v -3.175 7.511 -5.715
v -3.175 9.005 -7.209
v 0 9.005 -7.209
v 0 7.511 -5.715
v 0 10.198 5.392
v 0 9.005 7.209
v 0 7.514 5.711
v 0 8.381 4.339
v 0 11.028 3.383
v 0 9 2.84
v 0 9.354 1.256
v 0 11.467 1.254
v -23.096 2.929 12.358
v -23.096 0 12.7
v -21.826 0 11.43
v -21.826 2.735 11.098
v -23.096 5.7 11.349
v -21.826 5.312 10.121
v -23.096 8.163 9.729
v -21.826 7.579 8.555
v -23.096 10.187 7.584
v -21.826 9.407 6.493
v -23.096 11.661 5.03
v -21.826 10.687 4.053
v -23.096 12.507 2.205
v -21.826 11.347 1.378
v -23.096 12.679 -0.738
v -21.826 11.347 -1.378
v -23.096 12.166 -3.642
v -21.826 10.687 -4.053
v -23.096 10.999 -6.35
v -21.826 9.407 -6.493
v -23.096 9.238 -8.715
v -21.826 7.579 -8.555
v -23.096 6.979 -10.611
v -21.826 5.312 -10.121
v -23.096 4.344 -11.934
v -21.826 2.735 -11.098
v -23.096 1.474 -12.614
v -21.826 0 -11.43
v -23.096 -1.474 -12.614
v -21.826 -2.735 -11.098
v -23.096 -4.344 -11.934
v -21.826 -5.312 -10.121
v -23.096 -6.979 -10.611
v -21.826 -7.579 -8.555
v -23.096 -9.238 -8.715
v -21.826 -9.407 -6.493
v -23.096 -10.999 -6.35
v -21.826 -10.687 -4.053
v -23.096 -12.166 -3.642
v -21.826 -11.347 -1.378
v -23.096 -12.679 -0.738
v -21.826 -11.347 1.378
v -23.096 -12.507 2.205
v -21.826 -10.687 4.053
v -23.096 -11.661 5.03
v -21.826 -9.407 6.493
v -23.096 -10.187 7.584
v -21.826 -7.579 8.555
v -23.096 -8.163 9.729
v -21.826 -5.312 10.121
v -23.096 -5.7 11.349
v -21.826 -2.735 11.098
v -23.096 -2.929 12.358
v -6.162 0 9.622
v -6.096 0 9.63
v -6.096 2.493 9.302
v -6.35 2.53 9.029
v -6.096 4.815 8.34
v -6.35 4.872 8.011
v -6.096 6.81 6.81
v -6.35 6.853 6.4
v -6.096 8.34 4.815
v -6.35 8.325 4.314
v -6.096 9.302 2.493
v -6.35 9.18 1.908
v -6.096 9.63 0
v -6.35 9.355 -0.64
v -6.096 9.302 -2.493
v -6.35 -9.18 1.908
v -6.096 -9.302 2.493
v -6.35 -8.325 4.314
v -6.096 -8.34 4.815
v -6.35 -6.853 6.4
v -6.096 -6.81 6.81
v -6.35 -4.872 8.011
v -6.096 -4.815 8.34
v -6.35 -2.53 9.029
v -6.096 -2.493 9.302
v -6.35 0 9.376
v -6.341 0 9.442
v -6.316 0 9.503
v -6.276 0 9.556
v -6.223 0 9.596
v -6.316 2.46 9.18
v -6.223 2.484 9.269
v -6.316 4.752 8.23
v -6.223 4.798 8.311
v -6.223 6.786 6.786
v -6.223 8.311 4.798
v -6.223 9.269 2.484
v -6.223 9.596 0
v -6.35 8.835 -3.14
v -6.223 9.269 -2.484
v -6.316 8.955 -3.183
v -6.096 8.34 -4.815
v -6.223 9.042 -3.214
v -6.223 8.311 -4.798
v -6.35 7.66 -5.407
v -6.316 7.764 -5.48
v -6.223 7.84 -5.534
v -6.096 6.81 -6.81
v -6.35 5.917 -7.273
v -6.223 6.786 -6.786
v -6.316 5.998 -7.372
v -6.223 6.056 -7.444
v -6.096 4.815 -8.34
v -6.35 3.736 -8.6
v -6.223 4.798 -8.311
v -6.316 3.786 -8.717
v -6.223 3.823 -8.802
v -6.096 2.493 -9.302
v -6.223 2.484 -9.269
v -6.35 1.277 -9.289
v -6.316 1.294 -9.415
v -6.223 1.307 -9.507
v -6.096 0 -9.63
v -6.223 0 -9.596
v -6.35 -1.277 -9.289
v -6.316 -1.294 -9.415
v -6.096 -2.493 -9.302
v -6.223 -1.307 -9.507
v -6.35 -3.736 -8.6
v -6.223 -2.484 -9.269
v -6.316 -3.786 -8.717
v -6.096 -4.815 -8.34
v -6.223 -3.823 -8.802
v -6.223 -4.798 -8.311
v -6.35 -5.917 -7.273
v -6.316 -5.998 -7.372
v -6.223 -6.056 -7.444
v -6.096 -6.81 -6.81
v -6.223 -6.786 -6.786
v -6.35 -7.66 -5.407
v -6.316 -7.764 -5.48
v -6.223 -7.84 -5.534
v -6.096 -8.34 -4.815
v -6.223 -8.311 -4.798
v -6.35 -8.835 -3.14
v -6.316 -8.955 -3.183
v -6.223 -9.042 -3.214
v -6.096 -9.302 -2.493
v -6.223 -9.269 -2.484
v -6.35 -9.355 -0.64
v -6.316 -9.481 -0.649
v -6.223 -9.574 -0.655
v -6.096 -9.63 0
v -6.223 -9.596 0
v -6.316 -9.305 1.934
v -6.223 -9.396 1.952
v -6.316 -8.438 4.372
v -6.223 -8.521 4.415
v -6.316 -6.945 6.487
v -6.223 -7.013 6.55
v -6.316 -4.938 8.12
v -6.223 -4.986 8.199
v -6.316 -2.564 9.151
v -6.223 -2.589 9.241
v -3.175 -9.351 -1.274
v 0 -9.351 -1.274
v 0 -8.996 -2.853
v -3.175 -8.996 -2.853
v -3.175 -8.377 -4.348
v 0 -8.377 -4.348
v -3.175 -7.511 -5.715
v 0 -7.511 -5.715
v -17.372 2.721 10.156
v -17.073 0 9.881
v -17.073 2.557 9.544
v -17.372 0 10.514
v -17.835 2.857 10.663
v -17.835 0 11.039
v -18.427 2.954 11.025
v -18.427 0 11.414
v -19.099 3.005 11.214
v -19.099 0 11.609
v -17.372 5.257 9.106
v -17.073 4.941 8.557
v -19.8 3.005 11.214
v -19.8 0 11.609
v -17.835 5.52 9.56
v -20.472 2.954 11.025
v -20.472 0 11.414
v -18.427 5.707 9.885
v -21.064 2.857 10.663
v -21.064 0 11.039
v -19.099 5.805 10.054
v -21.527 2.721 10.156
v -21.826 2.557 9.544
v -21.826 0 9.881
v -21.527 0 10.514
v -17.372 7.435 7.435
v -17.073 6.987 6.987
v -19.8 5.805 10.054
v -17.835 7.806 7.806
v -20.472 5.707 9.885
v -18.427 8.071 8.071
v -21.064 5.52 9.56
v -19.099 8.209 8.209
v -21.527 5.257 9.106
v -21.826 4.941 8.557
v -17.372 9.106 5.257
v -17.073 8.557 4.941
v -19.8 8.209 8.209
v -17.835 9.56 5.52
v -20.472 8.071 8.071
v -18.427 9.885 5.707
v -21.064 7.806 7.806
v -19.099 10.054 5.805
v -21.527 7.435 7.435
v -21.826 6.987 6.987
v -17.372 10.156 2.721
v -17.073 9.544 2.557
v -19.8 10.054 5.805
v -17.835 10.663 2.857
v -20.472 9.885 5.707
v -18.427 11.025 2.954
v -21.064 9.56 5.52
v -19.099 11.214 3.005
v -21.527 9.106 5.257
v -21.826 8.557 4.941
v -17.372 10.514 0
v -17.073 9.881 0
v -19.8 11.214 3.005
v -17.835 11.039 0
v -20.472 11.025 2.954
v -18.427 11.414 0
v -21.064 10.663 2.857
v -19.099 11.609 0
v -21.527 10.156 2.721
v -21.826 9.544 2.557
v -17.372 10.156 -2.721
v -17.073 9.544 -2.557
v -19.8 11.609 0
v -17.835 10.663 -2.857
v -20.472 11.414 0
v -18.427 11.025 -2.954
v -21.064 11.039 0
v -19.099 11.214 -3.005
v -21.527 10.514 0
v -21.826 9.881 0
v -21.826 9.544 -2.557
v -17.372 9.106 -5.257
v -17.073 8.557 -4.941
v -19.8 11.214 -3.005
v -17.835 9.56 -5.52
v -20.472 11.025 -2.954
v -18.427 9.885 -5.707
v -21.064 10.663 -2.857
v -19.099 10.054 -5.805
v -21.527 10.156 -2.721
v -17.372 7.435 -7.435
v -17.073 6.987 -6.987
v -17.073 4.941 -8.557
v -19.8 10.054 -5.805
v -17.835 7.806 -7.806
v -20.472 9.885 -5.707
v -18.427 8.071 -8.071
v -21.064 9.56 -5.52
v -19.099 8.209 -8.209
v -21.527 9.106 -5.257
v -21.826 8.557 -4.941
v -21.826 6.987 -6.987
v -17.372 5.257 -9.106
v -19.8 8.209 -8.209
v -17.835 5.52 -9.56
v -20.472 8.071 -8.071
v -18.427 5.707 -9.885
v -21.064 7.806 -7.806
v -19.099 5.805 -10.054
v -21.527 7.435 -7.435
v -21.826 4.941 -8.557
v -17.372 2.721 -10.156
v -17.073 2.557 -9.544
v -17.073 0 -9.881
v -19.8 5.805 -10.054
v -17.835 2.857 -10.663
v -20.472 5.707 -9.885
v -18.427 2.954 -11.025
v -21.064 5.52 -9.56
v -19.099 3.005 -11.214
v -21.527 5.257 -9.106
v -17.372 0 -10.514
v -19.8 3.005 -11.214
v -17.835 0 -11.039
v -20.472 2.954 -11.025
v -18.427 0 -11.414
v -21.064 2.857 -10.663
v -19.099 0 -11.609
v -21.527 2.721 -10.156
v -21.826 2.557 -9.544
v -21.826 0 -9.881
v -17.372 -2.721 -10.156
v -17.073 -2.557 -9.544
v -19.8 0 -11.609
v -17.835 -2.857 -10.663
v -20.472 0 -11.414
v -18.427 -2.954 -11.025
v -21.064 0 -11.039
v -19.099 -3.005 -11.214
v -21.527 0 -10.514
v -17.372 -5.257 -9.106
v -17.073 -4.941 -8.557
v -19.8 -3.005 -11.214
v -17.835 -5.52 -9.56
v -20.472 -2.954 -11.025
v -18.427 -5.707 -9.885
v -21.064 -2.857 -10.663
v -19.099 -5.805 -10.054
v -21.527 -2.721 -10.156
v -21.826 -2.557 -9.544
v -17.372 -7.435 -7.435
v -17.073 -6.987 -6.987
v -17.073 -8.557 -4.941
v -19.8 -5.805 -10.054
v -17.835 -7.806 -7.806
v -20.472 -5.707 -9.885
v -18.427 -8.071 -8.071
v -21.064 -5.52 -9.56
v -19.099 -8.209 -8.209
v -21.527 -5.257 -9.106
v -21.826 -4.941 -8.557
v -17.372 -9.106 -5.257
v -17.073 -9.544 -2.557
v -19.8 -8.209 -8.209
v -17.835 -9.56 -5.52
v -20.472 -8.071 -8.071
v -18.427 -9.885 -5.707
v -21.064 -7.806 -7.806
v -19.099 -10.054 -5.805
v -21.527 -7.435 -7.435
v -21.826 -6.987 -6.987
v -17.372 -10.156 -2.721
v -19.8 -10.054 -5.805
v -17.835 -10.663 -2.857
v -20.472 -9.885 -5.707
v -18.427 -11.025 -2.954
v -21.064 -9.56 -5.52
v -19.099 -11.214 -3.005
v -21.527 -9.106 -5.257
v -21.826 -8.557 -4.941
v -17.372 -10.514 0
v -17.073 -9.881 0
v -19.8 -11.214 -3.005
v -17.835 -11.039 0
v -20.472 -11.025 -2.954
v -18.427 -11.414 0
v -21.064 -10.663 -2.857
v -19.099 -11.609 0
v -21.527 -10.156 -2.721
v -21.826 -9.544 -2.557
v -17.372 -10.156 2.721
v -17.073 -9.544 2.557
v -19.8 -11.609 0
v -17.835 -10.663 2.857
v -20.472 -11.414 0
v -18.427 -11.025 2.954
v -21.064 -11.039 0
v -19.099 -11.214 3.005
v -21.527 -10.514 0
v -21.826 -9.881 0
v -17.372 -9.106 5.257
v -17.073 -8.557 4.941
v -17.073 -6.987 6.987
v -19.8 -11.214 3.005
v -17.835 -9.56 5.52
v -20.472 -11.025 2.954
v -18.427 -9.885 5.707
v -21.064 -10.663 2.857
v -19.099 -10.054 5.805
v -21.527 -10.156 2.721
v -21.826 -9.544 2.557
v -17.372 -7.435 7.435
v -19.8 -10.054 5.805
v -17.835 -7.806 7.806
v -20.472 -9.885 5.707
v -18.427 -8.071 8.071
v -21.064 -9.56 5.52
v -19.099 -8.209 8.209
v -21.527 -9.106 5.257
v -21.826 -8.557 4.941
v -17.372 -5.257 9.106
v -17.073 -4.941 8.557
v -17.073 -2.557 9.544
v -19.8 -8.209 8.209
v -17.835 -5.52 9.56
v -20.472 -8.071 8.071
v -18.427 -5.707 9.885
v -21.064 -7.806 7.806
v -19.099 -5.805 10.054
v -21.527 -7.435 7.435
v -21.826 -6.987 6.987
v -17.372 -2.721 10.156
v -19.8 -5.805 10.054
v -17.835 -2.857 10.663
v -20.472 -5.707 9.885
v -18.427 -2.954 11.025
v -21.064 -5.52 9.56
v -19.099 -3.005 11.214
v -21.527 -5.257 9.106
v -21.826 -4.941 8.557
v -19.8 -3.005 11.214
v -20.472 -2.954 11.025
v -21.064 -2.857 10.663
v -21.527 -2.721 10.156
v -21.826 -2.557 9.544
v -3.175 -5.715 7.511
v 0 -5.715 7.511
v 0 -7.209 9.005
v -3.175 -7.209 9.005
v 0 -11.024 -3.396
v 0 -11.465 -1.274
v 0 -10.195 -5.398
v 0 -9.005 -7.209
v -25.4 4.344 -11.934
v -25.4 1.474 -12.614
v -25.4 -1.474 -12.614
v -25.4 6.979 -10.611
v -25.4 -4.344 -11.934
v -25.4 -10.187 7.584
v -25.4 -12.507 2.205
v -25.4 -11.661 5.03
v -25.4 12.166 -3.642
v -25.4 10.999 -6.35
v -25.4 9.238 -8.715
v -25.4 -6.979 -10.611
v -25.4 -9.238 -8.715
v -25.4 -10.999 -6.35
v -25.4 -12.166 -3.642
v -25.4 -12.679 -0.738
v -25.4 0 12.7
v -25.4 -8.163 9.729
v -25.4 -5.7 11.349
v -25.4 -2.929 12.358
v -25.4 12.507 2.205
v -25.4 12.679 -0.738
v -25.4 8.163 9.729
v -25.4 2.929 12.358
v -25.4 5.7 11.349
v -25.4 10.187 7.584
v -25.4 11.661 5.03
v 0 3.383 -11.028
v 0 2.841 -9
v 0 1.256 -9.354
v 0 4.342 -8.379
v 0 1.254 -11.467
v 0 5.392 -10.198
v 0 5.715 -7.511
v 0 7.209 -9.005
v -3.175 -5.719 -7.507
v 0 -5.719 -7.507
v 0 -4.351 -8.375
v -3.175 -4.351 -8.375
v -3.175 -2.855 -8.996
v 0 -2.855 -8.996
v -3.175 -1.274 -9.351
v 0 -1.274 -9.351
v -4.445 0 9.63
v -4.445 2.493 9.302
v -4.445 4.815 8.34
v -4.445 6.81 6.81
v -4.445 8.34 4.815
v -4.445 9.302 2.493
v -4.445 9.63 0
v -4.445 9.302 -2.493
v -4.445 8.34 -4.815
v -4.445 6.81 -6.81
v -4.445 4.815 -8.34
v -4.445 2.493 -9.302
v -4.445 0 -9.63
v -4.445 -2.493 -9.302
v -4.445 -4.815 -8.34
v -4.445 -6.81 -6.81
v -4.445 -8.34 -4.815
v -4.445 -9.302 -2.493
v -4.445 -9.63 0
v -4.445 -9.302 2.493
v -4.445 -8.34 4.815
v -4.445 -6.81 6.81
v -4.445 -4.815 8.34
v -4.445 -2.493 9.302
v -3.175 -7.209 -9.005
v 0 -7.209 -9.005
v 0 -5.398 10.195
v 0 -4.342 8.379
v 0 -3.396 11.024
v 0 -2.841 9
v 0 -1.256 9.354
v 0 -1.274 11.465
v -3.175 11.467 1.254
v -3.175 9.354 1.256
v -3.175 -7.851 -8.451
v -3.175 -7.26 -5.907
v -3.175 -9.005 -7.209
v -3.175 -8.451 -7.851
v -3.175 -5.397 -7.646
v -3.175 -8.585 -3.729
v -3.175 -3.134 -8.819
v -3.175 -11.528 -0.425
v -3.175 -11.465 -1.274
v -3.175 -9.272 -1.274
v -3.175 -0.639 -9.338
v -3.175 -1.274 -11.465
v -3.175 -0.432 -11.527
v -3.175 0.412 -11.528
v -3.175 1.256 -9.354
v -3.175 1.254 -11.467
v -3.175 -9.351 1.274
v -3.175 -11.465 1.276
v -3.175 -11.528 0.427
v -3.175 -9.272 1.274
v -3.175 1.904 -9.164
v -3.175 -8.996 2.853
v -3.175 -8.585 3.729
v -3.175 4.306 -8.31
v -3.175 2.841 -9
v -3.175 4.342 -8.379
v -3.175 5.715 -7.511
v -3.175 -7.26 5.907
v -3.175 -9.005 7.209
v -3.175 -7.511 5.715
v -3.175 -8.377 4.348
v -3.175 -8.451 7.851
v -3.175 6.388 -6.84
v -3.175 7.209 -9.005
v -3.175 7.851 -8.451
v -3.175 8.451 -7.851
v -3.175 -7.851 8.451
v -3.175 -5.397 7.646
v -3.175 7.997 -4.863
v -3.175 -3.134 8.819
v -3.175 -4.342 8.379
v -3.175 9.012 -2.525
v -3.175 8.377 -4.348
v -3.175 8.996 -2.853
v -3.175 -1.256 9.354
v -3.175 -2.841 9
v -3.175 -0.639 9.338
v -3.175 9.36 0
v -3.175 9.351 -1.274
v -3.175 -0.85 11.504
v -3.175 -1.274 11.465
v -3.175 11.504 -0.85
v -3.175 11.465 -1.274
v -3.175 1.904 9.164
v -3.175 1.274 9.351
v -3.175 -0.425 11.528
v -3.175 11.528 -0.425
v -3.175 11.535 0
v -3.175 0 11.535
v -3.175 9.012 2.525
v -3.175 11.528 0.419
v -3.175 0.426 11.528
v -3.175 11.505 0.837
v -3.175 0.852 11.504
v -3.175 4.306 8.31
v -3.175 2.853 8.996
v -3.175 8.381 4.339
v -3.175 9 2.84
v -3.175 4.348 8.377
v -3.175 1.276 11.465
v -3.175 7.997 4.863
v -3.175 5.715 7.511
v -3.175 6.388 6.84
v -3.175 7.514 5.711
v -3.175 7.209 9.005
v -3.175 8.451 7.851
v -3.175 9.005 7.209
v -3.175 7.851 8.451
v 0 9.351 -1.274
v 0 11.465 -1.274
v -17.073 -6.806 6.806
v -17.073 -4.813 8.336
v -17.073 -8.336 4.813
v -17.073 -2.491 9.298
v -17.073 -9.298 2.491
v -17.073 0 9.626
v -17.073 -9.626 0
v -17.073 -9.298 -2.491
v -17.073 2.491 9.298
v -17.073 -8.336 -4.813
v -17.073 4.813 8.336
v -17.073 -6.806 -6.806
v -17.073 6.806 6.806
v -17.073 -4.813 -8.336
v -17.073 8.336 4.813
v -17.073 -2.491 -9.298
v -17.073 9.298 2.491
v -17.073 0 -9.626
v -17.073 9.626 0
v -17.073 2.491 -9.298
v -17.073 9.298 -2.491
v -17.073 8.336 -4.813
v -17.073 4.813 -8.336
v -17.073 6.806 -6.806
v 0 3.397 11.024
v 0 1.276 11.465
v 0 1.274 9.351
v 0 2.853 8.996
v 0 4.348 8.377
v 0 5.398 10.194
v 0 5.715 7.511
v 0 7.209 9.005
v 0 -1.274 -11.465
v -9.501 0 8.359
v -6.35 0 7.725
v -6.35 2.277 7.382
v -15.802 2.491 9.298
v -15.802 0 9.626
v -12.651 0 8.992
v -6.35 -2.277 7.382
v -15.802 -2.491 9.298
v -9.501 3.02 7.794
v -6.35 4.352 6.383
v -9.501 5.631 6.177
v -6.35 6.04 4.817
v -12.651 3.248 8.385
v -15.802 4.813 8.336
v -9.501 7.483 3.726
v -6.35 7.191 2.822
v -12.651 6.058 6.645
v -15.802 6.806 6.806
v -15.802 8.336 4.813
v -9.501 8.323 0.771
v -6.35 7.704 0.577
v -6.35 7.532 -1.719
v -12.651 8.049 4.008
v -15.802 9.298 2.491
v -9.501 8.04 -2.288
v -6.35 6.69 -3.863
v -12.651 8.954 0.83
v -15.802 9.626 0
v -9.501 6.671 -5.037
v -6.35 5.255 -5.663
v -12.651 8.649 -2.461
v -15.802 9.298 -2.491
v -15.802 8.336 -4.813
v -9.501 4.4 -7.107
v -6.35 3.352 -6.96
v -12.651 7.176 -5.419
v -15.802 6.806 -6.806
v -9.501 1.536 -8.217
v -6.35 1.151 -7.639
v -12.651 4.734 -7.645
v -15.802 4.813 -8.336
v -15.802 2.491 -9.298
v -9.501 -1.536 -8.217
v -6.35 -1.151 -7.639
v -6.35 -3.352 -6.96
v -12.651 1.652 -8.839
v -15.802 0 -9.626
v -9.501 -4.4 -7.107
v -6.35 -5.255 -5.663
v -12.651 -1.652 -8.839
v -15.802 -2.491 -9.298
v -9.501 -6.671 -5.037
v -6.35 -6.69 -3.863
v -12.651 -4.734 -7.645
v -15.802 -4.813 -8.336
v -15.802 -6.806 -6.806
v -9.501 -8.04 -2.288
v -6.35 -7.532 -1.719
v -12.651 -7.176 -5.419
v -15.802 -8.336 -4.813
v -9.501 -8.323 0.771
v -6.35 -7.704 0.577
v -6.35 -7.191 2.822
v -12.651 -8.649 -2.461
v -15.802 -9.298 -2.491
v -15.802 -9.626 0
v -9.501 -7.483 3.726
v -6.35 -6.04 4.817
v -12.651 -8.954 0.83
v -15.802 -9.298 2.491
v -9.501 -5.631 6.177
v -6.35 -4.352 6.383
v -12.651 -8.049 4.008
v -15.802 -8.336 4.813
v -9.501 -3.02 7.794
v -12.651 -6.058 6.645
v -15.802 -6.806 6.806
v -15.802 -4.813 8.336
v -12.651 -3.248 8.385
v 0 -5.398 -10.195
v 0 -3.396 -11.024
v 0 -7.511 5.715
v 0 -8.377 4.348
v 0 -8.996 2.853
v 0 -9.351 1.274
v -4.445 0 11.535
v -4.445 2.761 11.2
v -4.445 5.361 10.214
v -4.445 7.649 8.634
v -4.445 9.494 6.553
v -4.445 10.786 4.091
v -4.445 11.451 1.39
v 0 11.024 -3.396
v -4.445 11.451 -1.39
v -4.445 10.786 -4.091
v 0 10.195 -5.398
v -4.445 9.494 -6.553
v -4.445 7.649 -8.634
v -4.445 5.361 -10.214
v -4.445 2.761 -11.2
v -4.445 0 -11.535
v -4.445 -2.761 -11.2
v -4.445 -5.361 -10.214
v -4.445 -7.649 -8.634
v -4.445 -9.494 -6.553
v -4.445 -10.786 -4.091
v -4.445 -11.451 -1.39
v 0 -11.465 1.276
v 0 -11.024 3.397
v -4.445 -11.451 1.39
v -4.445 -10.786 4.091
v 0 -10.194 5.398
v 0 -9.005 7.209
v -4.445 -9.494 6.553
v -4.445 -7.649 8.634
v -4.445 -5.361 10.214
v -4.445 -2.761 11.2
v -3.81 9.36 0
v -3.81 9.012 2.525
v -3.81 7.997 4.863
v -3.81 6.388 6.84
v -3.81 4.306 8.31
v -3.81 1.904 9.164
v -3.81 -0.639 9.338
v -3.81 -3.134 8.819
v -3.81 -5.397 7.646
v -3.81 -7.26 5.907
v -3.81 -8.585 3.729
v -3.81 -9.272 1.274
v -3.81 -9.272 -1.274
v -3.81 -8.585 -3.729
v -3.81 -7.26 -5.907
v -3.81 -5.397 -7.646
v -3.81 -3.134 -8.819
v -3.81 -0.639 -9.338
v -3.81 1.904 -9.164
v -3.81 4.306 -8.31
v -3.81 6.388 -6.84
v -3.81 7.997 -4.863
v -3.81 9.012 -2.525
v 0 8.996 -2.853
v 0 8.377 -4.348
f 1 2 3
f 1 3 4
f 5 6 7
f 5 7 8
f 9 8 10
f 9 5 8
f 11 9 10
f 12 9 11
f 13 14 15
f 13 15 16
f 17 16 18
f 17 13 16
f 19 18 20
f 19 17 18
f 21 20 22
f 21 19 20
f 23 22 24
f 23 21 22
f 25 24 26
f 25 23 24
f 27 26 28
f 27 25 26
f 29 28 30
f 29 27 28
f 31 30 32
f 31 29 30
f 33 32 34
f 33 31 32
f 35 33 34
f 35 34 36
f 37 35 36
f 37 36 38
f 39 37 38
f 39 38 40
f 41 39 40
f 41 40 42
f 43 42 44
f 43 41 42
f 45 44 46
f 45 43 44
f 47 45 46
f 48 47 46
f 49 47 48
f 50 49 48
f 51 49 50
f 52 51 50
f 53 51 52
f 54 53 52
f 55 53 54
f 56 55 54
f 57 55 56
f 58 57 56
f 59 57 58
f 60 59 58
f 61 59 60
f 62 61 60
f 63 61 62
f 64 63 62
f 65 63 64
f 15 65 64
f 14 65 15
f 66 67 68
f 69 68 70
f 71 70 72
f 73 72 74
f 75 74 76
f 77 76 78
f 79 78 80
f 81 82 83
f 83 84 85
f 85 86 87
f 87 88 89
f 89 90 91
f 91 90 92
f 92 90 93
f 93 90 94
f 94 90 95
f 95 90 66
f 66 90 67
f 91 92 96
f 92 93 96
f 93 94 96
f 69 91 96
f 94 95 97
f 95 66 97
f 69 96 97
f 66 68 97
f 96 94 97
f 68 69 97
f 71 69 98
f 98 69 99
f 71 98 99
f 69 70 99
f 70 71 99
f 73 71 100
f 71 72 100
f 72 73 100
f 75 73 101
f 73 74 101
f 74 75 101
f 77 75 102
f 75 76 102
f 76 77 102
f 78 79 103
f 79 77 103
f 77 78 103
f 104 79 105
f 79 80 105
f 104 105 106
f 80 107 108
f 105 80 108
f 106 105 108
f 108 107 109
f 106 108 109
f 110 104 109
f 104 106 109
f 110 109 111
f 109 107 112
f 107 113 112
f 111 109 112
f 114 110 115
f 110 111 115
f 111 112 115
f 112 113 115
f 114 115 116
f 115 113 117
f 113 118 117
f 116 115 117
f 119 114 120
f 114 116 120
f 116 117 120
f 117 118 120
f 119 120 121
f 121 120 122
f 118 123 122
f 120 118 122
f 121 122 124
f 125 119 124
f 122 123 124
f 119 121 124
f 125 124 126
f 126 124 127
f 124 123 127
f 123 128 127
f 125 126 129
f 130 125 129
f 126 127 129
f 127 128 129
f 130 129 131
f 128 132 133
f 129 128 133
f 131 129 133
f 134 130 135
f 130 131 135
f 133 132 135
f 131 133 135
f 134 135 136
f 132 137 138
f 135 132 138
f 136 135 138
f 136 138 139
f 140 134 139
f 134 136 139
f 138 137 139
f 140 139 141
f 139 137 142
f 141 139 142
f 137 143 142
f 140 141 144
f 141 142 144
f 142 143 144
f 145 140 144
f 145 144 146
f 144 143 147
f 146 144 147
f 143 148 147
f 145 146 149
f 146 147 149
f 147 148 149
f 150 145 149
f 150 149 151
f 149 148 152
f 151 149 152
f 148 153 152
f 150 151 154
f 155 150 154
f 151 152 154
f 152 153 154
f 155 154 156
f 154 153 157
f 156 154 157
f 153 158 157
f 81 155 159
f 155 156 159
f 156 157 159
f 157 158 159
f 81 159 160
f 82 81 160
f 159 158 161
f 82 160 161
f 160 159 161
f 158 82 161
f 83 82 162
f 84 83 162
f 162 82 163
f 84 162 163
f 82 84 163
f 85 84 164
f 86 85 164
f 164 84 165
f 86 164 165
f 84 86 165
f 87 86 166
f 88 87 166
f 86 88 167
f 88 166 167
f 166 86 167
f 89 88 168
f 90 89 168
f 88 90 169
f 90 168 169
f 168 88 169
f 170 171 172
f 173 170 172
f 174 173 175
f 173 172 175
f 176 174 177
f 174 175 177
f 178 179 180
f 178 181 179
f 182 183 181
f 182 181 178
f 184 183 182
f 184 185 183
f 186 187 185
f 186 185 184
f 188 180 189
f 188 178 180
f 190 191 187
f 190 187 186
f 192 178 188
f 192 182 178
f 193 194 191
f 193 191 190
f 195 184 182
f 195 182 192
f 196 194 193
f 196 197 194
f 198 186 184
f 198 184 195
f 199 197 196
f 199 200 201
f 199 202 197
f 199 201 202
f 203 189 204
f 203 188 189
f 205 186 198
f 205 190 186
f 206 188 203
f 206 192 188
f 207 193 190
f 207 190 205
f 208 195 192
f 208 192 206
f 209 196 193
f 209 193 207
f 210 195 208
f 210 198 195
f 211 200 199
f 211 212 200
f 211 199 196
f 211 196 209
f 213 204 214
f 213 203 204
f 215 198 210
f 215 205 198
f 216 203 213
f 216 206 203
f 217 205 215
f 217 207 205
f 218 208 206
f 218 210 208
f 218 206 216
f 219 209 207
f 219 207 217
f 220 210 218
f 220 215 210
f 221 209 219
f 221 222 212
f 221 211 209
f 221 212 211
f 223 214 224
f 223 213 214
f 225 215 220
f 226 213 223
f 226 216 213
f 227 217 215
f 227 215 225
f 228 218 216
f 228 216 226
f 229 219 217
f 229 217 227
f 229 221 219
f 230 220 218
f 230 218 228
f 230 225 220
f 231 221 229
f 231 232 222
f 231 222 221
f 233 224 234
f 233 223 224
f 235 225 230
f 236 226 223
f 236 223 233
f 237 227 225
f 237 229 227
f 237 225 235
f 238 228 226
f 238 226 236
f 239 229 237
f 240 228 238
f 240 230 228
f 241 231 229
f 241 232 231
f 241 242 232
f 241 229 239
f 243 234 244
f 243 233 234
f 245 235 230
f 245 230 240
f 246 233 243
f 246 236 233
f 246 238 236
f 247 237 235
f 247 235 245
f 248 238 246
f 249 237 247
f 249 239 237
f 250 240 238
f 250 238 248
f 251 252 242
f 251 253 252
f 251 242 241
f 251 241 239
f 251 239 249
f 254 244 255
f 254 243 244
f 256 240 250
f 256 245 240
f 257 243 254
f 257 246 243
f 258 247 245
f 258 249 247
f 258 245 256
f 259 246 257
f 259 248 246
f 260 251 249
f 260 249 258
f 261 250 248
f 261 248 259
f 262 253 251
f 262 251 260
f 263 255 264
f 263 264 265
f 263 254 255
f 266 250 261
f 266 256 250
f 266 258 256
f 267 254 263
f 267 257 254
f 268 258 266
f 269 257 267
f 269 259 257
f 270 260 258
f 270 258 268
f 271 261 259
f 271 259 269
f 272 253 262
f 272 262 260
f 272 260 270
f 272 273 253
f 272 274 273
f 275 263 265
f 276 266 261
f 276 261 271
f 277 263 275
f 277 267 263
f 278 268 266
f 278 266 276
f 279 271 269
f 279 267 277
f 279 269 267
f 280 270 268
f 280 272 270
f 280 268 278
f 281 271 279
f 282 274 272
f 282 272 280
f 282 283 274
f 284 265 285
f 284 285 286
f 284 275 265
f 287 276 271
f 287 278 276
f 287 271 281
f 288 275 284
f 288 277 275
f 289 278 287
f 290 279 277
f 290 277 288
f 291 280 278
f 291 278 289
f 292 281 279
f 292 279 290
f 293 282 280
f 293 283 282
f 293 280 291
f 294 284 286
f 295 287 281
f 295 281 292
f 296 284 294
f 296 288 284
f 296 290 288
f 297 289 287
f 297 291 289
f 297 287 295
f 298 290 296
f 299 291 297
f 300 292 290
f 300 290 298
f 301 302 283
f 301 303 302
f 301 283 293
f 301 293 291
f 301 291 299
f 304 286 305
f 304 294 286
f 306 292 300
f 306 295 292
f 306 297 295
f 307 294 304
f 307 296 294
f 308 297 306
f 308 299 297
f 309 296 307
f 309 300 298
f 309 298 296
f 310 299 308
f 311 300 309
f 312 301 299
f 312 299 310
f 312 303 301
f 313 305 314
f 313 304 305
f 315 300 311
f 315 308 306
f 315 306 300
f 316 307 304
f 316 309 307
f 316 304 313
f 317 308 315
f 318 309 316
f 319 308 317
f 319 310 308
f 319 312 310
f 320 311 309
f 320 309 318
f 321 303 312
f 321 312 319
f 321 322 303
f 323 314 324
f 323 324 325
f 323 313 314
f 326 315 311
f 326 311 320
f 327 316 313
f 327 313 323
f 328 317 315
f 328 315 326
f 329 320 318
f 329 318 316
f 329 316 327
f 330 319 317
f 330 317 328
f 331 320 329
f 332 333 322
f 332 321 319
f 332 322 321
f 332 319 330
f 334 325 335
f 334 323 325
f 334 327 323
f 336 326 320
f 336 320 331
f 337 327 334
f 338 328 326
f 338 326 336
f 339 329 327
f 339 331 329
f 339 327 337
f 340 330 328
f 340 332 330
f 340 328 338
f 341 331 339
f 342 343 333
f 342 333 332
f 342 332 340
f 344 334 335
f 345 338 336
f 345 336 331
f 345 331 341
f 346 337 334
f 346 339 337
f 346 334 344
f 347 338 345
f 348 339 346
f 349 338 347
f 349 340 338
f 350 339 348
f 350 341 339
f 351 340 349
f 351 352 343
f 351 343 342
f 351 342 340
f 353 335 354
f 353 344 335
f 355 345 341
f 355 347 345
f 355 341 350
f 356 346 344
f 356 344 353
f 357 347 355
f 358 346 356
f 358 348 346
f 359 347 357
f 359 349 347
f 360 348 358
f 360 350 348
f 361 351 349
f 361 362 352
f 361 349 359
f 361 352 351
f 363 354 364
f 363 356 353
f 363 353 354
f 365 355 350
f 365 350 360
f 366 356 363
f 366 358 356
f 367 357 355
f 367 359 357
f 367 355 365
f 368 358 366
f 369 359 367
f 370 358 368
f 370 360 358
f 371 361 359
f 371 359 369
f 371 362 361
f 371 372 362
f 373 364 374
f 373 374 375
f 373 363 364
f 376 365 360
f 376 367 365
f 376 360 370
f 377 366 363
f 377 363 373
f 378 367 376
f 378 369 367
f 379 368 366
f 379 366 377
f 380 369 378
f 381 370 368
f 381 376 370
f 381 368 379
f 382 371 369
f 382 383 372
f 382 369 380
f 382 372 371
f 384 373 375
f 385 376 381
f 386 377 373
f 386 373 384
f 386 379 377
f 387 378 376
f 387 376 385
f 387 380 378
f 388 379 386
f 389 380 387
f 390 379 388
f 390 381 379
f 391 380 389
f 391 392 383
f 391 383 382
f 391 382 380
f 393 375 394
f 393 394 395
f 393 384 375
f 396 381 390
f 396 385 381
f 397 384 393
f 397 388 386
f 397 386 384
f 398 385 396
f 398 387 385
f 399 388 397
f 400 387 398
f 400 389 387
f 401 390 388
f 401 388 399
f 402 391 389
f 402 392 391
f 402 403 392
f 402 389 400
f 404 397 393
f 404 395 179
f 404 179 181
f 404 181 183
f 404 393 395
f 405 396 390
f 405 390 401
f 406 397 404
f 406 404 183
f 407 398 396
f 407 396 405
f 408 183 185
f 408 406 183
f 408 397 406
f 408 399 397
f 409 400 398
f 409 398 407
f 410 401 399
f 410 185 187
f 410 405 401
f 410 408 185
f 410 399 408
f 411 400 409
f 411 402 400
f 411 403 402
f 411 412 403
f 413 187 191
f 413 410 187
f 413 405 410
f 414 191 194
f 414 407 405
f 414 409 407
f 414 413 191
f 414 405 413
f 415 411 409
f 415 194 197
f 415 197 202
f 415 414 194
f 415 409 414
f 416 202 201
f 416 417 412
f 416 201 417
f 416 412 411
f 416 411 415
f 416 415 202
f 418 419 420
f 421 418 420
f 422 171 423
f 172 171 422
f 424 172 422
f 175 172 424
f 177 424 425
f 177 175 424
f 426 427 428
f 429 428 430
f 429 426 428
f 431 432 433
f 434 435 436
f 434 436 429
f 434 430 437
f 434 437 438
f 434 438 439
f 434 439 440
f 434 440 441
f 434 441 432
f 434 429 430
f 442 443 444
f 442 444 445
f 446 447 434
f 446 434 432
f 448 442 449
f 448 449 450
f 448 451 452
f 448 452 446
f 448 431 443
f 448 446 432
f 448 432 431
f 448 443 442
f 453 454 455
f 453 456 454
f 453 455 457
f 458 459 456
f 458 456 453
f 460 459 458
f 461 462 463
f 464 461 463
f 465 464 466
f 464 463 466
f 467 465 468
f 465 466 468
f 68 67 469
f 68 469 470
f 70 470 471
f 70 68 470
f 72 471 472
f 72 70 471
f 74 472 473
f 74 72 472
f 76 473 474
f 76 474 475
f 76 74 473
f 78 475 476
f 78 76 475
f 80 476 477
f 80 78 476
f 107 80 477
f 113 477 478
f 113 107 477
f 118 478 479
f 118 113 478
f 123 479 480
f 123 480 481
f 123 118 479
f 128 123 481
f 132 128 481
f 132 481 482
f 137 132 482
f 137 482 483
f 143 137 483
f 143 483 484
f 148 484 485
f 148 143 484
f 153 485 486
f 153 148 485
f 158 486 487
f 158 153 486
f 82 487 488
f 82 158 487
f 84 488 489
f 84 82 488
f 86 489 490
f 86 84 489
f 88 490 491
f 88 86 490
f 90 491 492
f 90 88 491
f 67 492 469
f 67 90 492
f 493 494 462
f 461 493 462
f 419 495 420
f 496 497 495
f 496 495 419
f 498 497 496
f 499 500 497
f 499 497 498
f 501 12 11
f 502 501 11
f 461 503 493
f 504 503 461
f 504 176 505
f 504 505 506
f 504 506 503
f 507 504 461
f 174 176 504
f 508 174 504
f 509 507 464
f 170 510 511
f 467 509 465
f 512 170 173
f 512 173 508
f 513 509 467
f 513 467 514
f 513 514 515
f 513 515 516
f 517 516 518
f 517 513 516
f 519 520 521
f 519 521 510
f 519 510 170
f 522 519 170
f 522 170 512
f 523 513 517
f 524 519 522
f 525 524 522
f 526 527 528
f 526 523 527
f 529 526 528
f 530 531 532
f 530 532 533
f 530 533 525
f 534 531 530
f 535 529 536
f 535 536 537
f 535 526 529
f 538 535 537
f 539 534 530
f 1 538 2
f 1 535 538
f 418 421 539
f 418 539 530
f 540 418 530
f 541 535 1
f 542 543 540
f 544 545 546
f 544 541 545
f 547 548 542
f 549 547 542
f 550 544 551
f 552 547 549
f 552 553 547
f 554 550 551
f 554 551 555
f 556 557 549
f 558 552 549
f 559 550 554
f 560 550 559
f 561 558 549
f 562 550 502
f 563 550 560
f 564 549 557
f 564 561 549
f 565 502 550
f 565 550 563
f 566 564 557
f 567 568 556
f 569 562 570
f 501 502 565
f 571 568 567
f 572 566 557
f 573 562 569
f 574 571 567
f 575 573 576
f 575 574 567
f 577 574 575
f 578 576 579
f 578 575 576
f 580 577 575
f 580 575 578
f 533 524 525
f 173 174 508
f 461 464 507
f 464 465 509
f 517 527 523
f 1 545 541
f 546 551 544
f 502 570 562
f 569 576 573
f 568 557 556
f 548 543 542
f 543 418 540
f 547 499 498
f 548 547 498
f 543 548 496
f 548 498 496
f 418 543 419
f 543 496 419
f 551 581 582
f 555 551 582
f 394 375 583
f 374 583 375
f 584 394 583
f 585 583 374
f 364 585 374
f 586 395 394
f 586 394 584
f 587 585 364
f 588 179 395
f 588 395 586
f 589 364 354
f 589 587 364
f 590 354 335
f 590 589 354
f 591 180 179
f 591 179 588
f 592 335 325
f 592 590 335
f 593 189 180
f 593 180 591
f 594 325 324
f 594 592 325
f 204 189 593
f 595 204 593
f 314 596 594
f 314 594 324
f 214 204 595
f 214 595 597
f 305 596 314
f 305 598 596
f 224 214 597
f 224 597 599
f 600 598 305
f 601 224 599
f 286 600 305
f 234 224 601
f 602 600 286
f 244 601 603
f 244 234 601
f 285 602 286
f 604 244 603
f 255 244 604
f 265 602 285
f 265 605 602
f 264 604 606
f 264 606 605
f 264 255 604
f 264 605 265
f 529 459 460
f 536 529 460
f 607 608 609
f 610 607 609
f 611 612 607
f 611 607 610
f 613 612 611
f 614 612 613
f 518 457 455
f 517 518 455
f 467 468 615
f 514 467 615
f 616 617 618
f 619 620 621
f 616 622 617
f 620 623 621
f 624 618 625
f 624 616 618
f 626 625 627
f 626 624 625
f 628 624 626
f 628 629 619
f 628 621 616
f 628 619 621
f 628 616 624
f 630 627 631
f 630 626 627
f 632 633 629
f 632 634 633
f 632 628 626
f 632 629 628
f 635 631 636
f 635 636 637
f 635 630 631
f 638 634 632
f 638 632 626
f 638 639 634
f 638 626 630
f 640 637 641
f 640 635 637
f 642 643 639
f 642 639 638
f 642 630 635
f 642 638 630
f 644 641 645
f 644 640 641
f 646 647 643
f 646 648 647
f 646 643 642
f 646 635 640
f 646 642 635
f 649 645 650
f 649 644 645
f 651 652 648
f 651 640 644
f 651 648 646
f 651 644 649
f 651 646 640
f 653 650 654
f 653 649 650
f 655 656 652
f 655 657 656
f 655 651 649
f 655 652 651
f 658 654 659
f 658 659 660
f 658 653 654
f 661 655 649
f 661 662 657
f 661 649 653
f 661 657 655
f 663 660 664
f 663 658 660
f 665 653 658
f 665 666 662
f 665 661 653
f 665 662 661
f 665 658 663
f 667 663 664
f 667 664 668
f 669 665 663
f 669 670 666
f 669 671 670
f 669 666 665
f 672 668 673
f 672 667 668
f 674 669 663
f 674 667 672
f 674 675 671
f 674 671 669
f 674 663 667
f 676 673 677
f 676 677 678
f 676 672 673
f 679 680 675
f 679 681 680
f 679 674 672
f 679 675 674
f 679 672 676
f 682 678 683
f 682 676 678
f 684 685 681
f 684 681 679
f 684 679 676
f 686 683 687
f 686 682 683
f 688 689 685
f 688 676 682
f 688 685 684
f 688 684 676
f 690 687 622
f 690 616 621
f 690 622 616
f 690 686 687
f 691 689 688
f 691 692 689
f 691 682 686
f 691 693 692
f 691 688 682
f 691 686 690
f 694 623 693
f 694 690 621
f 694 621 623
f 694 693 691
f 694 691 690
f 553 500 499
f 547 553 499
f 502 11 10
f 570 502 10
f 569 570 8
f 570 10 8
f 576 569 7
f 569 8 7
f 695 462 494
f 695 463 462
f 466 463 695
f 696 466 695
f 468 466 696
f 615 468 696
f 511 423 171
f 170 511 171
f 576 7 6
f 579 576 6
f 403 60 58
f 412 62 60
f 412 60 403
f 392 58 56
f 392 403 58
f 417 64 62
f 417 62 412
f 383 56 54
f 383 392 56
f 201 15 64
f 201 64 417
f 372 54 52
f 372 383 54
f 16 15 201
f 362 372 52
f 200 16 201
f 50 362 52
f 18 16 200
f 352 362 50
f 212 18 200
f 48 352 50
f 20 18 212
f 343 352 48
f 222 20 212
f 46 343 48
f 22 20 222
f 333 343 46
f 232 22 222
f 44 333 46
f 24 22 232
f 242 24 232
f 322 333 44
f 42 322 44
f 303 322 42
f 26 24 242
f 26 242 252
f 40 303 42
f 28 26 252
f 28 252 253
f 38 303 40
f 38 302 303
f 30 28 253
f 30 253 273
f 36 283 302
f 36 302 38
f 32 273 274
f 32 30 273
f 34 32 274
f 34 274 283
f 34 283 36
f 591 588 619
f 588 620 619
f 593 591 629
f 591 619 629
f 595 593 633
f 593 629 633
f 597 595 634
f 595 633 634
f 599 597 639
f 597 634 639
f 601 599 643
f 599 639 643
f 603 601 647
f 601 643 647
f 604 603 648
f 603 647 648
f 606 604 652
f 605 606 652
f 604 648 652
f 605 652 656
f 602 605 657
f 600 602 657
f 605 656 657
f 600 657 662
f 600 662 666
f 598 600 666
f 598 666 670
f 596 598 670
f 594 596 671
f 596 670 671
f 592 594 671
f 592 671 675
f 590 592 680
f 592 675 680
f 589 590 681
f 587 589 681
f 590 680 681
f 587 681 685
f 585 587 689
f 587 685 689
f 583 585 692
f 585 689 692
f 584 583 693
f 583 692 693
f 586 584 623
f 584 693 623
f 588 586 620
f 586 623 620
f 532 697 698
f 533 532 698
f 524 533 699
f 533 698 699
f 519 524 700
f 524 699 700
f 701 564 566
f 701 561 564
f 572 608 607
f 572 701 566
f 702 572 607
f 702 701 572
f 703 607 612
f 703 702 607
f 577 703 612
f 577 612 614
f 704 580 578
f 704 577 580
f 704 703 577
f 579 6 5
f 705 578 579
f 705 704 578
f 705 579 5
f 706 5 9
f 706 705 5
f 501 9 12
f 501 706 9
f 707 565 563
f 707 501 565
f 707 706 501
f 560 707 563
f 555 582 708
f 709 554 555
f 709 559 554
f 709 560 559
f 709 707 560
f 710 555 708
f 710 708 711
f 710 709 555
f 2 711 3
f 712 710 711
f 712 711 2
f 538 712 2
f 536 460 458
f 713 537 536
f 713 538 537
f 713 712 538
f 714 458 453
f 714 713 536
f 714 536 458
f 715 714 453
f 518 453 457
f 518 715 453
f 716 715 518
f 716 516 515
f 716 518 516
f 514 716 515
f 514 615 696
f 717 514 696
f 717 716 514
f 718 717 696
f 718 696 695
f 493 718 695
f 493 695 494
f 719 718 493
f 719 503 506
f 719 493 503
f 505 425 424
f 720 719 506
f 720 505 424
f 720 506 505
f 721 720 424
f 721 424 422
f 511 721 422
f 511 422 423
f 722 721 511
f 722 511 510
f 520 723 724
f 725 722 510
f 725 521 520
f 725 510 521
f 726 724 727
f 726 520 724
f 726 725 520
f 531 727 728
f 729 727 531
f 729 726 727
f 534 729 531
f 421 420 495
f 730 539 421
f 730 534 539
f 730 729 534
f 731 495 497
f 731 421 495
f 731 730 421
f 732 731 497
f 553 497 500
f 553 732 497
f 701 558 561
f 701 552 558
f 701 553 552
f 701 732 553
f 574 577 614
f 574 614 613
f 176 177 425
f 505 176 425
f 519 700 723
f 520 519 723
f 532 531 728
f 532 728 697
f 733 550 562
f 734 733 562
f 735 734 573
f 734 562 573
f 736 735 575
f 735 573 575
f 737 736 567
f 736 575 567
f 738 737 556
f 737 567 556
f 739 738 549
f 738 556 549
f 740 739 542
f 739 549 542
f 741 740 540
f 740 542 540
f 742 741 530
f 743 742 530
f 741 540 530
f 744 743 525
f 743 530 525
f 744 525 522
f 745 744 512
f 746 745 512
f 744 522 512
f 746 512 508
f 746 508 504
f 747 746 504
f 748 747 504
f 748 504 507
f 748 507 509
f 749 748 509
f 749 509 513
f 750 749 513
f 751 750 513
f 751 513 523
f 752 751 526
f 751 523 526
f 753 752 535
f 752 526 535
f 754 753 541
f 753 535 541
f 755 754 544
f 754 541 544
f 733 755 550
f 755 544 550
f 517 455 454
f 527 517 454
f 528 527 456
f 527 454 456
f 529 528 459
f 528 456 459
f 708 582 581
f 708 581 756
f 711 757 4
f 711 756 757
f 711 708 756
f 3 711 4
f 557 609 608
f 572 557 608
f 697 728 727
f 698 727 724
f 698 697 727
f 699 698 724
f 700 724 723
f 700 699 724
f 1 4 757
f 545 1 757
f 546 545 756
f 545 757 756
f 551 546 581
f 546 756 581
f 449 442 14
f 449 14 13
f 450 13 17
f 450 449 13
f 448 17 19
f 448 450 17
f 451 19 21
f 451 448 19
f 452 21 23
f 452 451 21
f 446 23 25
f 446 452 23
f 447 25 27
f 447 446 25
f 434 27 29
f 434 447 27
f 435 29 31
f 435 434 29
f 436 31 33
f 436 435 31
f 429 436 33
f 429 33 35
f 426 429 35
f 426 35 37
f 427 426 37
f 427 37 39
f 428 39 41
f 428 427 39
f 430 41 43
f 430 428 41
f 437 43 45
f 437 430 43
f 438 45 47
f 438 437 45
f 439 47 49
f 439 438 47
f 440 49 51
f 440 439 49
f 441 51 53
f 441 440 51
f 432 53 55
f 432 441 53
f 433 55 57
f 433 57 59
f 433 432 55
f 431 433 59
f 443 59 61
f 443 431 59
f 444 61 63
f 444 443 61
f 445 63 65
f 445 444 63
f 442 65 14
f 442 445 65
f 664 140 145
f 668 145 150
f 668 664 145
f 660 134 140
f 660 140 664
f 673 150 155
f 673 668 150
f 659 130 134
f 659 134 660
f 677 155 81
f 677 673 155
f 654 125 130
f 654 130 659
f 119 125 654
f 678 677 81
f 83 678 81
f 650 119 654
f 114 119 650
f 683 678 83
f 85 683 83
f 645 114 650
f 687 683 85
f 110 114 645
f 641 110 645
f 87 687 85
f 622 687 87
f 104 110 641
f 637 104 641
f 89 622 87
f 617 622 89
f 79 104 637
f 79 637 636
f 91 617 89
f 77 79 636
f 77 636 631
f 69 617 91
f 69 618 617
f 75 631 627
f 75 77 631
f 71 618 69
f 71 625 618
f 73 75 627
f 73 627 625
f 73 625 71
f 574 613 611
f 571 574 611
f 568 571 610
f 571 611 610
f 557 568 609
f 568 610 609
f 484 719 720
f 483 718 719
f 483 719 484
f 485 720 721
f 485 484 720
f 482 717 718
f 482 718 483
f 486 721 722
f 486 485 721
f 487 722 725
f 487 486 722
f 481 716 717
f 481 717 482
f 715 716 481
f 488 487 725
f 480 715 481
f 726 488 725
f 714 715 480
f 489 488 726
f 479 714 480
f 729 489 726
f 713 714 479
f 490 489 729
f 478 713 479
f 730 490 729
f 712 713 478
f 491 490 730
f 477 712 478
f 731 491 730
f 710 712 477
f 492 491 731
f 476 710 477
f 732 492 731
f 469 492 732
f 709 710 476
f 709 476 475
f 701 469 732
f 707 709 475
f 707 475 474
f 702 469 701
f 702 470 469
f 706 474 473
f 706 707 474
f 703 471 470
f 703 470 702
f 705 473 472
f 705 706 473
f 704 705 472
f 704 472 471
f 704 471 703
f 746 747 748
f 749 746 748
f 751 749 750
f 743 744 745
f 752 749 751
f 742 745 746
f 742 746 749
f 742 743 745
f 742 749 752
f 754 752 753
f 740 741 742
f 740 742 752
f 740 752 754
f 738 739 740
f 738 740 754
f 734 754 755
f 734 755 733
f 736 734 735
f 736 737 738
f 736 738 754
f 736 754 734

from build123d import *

# Parameters (mm, degrees)
F0_W     = 1.2712626288
F0_H     = 9.6255521612
F3_SIZE  = 1.27
F4_R     = 0.254
F5_DEPTH = 3.175
F6_R     = 9.3595697084
F7_DEPTH = 0.635


with BuildPart() as f1:
    # F0 (on Front) → F1 (revolve)
    with BuildSketch(Plane.XZ):
        Polygon((-15.8015552493, 0), (0, 0), (0, 11.5354972151), (-4.445, 11.5354972151), (-4.445, 9.6304972151), (-6.35, 9.6304972151), (-6.35, 7.7254972151), (-15.8015552493, 9.6255521612), align=None)
        with Locations((-16.4371865637, 4.8127760806)):
            Rectangle(F0_W, F0_H)
        with BuildLine():
            Line((-25.4, 0), (-17.0728178781, 0))
            Line((-17.0728178781, 0), (-17.0728178781, 9.6255521612))
            Line((-17.0728178781, 9.6255521612), (-17.0728178781, 9.8811152703))
            ThreePointArc((-17.0728178781, 9.8811152703), (-19.4495251043, 11.6341692899), (-21.8262323304, 9.8811152703))
            Line((-21.8262323304, 9.8811152703), (-21.8262323304, 12.7))
            Line((-21.8262323304, 12.7), (-25.4, 12.7))
            Line((-25.4, 12.7), (-25.4, 0))
        make_face()
    revolve(axis=Axis((-12.7, 0, 0), (-1, 0, 0)))

    # F3
    f3_edges = [f1.edges().sort_by_distance(p)[0] for p in [
        (-21.826232, 0, -12.7),
    ]]
    chamfer(f3_edges, length=F3_SIZE)

    # F4
    f4_edges = [f1.edges().sort_by_distance(p)[0] for p in [
        (-6.35, 0, -9.630497),
    ]]
    fillet(f4_edges, radius=F4_R)

    # F2 (on face) → F5 (cut)
    with BuildSketch(Plane.YZ):
        with BuildLine():
            ThreePointArc((-7.5107795932, 5.714728369), (-6.6734522711, 6.6734522711), (-5.714728369, 7.5107795932))
            Line((-5.714728369, 7.5107795932), (-7.2092179392, 9.0052691634))
            ThreePointArc((-7.2092179392, 9.0052691634), (-8.1568283052, 8.1568283052), (-9.0052691634, 7.2092179392))
            Line((-9.0052691634, 7.2092179392), (-7.5107795932, 5.714728369))
        make_face()
        with BuildLine():
            ThreePointArc((-1.2562011473, 9.3537099114), (0.0090057319, 9.4376824129), (1.2740500488, 9.3512954665))
            Line((1.2740500488, 9.3512954665), (1.2760667257, 11.464700158))
            ThreePointArc((1.2760667257, 11.464700158), (0.0010145552, 11.5354971705), (-1.2740500488, 11.4649244426))
            Line((-1.2740500488, 11.4649244426), (-1.2562011473, 9.3537099114))
        make_face()
        with BuildLine():
            ThreePointArc((5.714728369, 7.5107795932), (6.6752371757, 6.671666889), (7.5138358891, 5.7107092958))
            Line((7.5138358891, 5.7107092958), (9.0052691634, 7.2092179392))
            ThreePointArc((9.0052691634, 7.2092179392), (8.1568283052, 8.1568283052), (7.2092179392, 9.0052691634))
            Line((7.2092179392, 9.0052691634), (5.714728369, 7.5107795932))
        make_face()
        with BuildLine():
            ThreePointArc((9.3537099114, 1.2562011473), (9.4166691071, 0.6295024673), (9.4376867096, 0))
            ThreePointArc((9.4376867096, 0), (9.4160641292, -0.6384878569), (9.3512954665, -1.2740500488))
            Line((9.3512954665, -1.2740500488), (11.4649244426, -1.2740500488))
            ThreePointArc((11.4649244426, -1.2740500488), (11.517840509, -0.6380015758), (11.5354972151, 0))
            ThreePointArc((11.5354972151, 0), (11.5183888753, 0.6280236595), (11.4671146028, 1.2541844704))
            Line((11.4671146028, 1.2541844704), (9.3537099114, 1.2562011473))
        make_face()
        with BuildLine():
            Line((9.0052691634, -7.2092179392), (7.5107795932, -5.714728369))
            ThreePointArc((7.5107795932, -5.714728369), (6.6734522711, -6.6734522711), (5.714728369, -7.5107795932))
            Line((5.714728369, -7.5107795932), (7.2092179392, -9.0052691634))
            ThreePointArc((7.2092179392, -9.0052691634), (8.1568283052, -8.1568283052), (9.0052691634, -7.2092179392))
        make_face()
        with BuildLine():
            Line((1.2541844704, -11.4671146028), (1.2562011473, -9.3537099114))
            ThreePointArc((1.2562011473, -9.3537099114), (-0.0090057319, -9.4376824129), (-1.2740500488, -9.3512954665))
            Line((-1.2740500488, -9.3512954665), (-1.2740500488, -11.4649244426))
            ThreePointArc((-1.2740500488, -11.4649244426), (-0.0099929726, -11.5354928868), (1.2541844704, -11.4671146028))
        make_face()
        with BuildLine():
            Line((-7.2092179392, -9.0052691634), (-5.7192543462, -7.5073337579))
            ThreePointArc((-5.7192543462, -7.5073337579), (-6.6754631322, -6.6714408039), (-7.5107795932, -5.714728369))
            Line((-7.5107795932, -5.714728369), (-9.0052691634, -7.2092179392))
            ThreePointArc((-9.0052691634, -7.2092179392), (-8.1568283052, -8.1568283052), (-7.2092179392, -9.0052691634))
        make_face()
        with BuildLine():
            ThreePointArc((-9.3512954665, -1.2740500488), (-9.4376867096, 0), (-9.3512954665, 1.2740500488))
            Line((-9.3512954665, 1.2740500488), (-11.464700158, 1.2760667257))
            ThreePointArc((-11.464700158, 1.2760667257), (-11.5354971705, 0.0010145552), (-11.4649244426, -1.2740500488))
            Line((-11.4649244426, -1.2740500488), (-9.3512954665, -1.2740500488))
        make_face()
        with BuildLine():
            ThreePointArc((9.3512954665, -1.2740500488), (9.4160641292, -0.6384878569), (9.4376867096, 0))
            ThreePointArc((9.4376867096, 0), (9.4166691071, 0.6295024673), (9.3537099114, 1.2562011473))
            ThreePointArc((9.3537099114, 1.2562011473), (8.7229115577, 3.6028800126), (7.5138358891, 5.7107092958))
            ThreePointArc((7.5138358891, 5.7107092958), (6.6752371757, 6.671666889), (5.714728369, 7.5107795932))
            ThreePointArc((5.714728369, 7.5107795932), (3.6135343658, 8.7185033014), (1.2740500488, 9.3512954665))
            ThreePointArc((1.2740500488, 9.3512954665), (0.0090057319, 9.4376824129), (-1.2562011473, 9.3537099114))
            ThreePointArc((-1.2562011473, 9.3537099114), (-3.6052132558, 8.721947478), (-5.714728369, 7.5107795932))
            ThreePointArc((-5.714728369, 7.5107795932), (-6.6734522711, 6.6734522711), (-7.5107795932, 5.714728369))
            ThreePointArc((-7.5107795932, 5.714728369), (-8.7185033014, 3.6135343658), (-9.3512954665, 1.2740500488))
            ThreePointArc((-9.3512954665, 1.2740500488), (-9.4376867096, 0), (-9.3512954665, -1.2740500488))
            ThreePointArc((-9.3512954665, -1.2740500488), (-8.7185033014, -3.6135343658), (-7.5107795932, -5.714728369))
            ThreePointArc((-7.5107795932, -5.714728369), (-6.6754631322, -6.6714408039), (-5.7192543462, -7.5073337579))
            ThreePointArc((-5.7192543462, -7.5073337579), (-3.6161616786, -8.7174139023), (-1.2740500488, -9.3512954665))
            ThreePointArc((-1.2740500488, -9.3512954665), (-0.0090057319, -9.4376824129), (1.2562011473, -9.3537099114))
            ThreePointArc((1.2562011473, -9.3537099114), (3.6052132558, -8.721947478), (5.714728369, -7.5107795932))
            ThreePointArc((5.714728369, -7.5107795932), (6.6734522711, -6.6734522711), (7.5107795932, -5.714728369))
            ThreePointArc((7.5107795932, -5.714728369), (8.7185033014, -3.6135343658), (9.3512954665, -1.2740500488))
        make_face()
    extrude(amount=-F5_DEPTH, mode=Mode.SUBTRACT)

    # F6 (on face) → F7 (cut)
    with BuildSketch(Plane.YZ.offset(-3.175)):
        Circle(F6_R)
    extrude(amount=-F7_DEPTH, mode=Mode.SUBTRACT)


solid = f1.part
